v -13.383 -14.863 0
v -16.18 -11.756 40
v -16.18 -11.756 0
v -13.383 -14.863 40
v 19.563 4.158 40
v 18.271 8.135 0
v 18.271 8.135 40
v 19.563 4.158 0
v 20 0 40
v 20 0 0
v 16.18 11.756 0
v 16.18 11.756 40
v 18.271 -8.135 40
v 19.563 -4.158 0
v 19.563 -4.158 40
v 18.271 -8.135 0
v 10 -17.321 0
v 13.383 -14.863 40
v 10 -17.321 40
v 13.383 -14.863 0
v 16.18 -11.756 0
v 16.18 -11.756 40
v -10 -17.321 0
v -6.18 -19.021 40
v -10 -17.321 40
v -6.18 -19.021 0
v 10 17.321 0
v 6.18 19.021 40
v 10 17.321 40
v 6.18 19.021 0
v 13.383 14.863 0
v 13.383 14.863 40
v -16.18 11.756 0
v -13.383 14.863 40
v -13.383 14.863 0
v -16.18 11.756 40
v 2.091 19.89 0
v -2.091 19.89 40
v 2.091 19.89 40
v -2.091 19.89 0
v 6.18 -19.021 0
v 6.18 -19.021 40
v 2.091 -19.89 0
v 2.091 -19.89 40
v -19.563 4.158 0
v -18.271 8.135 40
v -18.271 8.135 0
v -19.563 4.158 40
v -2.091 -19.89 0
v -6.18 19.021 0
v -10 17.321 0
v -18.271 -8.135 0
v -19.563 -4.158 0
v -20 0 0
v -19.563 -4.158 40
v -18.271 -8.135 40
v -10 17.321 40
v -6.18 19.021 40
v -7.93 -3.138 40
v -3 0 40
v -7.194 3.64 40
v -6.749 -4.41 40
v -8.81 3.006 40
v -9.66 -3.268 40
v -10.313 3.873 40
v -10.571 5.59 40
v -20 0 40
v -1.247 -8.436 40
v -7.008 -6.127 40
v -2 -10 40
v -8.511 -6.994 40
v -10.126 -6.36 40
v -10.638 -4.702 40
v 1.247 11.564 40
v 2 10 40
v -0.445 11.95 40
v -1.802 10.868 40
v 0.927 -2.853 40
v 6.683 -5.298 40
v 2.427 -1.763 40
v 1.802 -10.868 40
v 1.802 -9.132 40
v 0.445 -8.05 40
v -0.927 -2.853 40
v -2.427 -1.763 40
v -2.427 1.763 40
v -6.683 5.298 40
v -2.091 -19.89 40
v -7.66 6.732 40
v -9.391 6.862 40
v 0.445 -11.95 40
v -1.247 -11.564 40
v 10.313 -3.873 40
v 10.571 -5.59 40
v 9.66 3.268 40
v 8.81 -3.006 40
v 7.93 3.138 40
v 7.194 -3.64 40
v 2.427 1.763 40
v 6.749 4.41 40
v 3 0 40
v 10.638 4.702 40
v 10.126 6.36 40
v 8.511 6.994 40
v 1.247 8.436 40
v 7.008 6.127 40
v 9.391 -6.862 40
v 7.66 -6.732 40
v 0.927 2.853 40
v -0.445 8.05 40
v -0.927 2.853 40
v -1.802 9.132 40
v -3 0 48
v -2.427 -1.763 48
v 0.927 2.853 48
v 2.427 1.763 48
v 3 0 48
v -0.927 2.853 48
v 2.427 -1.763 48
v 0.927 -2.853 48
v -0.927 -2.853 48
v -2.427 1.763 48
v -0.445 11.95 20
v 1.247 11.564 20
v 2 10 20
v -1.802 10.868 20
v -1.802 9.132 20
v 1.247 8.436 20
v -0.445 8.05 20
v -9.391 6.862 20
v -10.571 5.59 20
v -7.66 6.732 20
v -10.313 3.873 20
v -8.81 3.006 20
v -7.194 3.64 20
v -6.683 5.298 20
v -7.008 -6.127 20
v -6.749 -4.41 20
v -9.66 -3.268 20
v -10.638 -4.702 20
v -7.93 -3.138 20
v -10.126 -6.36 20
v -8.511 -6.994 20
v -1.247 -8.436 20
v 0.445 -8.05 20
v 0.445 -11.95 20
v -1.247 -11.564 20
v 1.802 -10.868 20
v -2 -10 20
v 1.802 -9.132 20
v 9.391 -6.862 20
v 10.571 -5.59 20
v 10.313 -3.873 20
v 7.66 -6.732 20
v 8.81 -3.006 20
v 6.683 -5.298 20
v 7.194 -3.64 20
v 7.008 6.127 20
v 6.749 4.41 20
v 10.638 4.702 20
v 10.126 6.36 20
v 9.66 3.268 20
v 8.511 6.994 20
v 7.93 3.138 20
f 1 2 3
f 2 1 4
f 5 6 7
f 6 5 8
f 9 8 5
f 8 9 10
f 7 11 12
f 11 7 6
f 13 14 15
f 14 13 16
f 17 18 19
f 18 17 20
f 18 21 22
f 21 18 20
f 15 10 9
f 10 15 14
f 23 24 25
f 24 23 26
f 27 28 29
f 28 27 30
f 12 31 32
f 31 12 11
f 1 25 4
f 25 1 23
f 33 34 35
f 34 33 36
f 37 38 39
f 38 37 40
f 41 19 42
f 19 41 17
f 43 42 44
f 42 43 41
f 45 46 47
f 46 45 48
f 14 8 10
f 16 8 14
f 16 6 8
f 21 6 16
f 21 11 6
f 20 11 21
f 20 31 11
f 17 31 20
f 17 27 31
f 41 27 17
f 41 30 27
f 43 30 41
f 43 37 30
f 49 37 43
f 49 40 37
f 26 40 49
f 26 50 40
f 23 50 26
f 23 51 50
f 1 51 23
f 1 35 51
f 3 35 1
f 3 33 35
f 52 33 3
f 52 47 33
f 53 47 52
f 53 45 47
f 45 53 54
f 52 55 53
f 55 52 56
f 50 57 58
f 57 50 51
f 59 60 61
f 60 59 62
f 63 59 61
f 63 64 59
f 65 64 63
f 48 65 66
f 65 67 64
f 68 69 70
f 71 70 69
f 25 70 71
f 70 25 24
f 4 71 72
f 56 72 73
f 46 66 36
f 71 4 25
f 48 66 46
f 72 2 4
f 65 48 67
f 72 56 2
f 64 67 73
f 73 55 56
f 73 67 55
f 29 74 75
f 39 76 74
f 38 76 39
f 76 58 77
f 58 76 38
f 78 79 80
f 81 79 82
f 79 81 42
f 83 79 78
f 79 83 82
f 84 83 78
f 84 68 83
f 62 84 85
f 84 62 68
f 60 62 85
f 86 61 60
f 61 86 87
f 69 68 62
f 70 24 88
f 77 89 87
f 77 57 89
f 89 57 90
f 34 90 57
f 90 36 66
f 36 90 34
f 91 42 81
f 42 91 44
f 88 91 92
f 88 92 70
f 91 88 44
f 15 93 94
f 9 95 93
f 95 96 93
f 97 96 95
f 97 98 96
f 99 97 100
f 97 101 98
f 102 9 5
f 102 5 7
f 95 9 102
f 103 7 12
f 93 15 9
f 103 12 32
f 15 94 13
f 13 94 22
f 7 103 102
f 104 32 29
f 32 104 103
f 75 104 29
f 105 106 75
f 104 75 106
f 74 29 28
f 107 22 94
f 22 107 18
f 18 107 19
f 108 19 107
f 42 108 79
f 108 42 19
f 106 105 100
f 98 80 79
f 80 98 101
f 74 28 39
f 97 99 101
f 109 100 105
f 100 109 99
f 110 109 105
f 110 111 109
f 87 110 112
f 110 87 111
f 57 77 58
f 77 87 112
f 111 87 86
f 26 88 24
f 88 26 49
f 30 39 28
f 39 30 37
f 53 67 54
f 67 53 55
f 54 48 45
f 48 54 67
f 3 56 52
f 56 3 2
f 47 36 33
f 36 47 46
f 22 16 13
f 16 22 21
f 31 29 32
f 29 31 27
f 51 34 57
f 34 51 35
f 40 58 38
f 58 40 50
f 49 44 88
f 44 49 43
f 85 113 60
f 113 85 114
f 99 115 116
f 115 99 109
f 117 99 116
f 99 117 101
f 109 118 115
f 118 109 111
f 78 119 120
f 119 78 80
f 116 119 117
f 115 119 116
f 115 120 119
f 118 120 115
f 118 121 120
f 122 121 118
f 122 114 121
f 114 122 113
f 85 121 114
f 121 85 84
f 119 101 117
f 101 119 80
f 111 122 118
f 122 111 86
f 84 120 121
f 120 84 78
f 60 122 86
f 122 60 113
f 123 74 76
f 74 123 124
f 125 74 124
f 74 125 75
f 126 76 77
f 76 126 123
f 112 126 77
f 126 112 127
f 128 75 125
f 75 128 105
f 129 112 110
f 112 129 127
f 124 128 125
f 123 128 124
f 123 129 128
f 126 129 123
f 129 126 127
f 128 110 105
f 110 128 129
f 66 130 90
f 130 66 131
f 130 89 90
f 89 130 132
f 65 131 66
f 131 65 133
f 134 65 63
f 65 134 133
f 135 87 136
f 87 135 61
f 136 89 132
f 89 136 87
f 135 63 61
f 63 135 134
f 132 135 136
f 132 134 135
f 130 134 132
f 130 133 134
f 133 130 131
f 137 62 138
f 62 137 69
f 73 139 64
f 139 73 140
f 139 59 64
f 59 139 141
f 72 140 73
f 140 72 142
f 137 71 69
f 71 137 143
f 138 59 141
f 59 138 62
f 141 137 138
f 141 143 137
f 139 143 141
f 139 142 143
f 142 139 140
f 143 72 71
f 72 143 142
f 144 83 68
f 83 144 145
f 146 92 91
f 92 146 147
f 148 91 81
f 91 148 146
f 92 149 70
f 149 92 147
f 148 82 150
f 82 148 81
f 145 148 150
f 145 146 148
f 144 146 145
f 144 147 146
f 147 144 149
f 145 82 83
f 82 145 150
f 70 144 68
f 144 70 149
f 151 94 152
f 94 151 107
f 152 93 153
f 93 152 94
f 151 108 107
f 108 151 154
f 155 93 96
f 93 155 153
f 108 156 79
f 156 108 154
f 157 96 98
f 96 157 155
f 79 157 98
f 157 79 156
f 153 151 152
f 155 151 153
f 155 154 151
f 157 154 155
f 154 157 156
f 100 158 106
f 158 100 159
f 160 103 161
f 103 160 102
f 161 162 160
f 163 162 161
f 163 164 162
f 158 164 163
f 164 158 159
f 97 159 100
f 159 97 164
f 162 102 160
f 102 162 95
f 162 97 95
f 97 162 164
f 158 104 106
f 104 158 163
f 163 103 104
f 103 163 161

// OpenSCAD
// file: configuration.scad
/* ROTARY ENCODER DIMENSIONS */

// Main body size:
enc_body_radius = 20;
enc_body_length = 40;

// Shaft parameters
enc_shaft_radius = 3;
enc_shaft_length = 8;

// Mount screw parameters:
enc_screw_count = 6;
enc_screw_distance_from_center = 10;
enc_screw_depth = 20;
enc_screw_radius = 2;
// main file
include <configuration.scad>

module encoderSolid(){

// Encoder body:
cylinder(r=enc_body_radius, h=enc_body_length);
// Encoder shaft:
cylinder(r=enc_shaft_radius, h=enc_shaft_length + enc_body_length);

}

module screwHoles(){
  for(z=[0:enc_screw_count]){

	rotate( a = 360 / enc_screw_count * z, v=[0, 0, 1]){
      translate([ 0, enc_screw_distance_from_center, enc_body_length - enc_screw_depth ]){

        cylinder(r = enc_screw_radius, h=enc_screw_depth);
      }
    }
  }
}

difference(){
	encoderSolid();
	screwHoles();
}
